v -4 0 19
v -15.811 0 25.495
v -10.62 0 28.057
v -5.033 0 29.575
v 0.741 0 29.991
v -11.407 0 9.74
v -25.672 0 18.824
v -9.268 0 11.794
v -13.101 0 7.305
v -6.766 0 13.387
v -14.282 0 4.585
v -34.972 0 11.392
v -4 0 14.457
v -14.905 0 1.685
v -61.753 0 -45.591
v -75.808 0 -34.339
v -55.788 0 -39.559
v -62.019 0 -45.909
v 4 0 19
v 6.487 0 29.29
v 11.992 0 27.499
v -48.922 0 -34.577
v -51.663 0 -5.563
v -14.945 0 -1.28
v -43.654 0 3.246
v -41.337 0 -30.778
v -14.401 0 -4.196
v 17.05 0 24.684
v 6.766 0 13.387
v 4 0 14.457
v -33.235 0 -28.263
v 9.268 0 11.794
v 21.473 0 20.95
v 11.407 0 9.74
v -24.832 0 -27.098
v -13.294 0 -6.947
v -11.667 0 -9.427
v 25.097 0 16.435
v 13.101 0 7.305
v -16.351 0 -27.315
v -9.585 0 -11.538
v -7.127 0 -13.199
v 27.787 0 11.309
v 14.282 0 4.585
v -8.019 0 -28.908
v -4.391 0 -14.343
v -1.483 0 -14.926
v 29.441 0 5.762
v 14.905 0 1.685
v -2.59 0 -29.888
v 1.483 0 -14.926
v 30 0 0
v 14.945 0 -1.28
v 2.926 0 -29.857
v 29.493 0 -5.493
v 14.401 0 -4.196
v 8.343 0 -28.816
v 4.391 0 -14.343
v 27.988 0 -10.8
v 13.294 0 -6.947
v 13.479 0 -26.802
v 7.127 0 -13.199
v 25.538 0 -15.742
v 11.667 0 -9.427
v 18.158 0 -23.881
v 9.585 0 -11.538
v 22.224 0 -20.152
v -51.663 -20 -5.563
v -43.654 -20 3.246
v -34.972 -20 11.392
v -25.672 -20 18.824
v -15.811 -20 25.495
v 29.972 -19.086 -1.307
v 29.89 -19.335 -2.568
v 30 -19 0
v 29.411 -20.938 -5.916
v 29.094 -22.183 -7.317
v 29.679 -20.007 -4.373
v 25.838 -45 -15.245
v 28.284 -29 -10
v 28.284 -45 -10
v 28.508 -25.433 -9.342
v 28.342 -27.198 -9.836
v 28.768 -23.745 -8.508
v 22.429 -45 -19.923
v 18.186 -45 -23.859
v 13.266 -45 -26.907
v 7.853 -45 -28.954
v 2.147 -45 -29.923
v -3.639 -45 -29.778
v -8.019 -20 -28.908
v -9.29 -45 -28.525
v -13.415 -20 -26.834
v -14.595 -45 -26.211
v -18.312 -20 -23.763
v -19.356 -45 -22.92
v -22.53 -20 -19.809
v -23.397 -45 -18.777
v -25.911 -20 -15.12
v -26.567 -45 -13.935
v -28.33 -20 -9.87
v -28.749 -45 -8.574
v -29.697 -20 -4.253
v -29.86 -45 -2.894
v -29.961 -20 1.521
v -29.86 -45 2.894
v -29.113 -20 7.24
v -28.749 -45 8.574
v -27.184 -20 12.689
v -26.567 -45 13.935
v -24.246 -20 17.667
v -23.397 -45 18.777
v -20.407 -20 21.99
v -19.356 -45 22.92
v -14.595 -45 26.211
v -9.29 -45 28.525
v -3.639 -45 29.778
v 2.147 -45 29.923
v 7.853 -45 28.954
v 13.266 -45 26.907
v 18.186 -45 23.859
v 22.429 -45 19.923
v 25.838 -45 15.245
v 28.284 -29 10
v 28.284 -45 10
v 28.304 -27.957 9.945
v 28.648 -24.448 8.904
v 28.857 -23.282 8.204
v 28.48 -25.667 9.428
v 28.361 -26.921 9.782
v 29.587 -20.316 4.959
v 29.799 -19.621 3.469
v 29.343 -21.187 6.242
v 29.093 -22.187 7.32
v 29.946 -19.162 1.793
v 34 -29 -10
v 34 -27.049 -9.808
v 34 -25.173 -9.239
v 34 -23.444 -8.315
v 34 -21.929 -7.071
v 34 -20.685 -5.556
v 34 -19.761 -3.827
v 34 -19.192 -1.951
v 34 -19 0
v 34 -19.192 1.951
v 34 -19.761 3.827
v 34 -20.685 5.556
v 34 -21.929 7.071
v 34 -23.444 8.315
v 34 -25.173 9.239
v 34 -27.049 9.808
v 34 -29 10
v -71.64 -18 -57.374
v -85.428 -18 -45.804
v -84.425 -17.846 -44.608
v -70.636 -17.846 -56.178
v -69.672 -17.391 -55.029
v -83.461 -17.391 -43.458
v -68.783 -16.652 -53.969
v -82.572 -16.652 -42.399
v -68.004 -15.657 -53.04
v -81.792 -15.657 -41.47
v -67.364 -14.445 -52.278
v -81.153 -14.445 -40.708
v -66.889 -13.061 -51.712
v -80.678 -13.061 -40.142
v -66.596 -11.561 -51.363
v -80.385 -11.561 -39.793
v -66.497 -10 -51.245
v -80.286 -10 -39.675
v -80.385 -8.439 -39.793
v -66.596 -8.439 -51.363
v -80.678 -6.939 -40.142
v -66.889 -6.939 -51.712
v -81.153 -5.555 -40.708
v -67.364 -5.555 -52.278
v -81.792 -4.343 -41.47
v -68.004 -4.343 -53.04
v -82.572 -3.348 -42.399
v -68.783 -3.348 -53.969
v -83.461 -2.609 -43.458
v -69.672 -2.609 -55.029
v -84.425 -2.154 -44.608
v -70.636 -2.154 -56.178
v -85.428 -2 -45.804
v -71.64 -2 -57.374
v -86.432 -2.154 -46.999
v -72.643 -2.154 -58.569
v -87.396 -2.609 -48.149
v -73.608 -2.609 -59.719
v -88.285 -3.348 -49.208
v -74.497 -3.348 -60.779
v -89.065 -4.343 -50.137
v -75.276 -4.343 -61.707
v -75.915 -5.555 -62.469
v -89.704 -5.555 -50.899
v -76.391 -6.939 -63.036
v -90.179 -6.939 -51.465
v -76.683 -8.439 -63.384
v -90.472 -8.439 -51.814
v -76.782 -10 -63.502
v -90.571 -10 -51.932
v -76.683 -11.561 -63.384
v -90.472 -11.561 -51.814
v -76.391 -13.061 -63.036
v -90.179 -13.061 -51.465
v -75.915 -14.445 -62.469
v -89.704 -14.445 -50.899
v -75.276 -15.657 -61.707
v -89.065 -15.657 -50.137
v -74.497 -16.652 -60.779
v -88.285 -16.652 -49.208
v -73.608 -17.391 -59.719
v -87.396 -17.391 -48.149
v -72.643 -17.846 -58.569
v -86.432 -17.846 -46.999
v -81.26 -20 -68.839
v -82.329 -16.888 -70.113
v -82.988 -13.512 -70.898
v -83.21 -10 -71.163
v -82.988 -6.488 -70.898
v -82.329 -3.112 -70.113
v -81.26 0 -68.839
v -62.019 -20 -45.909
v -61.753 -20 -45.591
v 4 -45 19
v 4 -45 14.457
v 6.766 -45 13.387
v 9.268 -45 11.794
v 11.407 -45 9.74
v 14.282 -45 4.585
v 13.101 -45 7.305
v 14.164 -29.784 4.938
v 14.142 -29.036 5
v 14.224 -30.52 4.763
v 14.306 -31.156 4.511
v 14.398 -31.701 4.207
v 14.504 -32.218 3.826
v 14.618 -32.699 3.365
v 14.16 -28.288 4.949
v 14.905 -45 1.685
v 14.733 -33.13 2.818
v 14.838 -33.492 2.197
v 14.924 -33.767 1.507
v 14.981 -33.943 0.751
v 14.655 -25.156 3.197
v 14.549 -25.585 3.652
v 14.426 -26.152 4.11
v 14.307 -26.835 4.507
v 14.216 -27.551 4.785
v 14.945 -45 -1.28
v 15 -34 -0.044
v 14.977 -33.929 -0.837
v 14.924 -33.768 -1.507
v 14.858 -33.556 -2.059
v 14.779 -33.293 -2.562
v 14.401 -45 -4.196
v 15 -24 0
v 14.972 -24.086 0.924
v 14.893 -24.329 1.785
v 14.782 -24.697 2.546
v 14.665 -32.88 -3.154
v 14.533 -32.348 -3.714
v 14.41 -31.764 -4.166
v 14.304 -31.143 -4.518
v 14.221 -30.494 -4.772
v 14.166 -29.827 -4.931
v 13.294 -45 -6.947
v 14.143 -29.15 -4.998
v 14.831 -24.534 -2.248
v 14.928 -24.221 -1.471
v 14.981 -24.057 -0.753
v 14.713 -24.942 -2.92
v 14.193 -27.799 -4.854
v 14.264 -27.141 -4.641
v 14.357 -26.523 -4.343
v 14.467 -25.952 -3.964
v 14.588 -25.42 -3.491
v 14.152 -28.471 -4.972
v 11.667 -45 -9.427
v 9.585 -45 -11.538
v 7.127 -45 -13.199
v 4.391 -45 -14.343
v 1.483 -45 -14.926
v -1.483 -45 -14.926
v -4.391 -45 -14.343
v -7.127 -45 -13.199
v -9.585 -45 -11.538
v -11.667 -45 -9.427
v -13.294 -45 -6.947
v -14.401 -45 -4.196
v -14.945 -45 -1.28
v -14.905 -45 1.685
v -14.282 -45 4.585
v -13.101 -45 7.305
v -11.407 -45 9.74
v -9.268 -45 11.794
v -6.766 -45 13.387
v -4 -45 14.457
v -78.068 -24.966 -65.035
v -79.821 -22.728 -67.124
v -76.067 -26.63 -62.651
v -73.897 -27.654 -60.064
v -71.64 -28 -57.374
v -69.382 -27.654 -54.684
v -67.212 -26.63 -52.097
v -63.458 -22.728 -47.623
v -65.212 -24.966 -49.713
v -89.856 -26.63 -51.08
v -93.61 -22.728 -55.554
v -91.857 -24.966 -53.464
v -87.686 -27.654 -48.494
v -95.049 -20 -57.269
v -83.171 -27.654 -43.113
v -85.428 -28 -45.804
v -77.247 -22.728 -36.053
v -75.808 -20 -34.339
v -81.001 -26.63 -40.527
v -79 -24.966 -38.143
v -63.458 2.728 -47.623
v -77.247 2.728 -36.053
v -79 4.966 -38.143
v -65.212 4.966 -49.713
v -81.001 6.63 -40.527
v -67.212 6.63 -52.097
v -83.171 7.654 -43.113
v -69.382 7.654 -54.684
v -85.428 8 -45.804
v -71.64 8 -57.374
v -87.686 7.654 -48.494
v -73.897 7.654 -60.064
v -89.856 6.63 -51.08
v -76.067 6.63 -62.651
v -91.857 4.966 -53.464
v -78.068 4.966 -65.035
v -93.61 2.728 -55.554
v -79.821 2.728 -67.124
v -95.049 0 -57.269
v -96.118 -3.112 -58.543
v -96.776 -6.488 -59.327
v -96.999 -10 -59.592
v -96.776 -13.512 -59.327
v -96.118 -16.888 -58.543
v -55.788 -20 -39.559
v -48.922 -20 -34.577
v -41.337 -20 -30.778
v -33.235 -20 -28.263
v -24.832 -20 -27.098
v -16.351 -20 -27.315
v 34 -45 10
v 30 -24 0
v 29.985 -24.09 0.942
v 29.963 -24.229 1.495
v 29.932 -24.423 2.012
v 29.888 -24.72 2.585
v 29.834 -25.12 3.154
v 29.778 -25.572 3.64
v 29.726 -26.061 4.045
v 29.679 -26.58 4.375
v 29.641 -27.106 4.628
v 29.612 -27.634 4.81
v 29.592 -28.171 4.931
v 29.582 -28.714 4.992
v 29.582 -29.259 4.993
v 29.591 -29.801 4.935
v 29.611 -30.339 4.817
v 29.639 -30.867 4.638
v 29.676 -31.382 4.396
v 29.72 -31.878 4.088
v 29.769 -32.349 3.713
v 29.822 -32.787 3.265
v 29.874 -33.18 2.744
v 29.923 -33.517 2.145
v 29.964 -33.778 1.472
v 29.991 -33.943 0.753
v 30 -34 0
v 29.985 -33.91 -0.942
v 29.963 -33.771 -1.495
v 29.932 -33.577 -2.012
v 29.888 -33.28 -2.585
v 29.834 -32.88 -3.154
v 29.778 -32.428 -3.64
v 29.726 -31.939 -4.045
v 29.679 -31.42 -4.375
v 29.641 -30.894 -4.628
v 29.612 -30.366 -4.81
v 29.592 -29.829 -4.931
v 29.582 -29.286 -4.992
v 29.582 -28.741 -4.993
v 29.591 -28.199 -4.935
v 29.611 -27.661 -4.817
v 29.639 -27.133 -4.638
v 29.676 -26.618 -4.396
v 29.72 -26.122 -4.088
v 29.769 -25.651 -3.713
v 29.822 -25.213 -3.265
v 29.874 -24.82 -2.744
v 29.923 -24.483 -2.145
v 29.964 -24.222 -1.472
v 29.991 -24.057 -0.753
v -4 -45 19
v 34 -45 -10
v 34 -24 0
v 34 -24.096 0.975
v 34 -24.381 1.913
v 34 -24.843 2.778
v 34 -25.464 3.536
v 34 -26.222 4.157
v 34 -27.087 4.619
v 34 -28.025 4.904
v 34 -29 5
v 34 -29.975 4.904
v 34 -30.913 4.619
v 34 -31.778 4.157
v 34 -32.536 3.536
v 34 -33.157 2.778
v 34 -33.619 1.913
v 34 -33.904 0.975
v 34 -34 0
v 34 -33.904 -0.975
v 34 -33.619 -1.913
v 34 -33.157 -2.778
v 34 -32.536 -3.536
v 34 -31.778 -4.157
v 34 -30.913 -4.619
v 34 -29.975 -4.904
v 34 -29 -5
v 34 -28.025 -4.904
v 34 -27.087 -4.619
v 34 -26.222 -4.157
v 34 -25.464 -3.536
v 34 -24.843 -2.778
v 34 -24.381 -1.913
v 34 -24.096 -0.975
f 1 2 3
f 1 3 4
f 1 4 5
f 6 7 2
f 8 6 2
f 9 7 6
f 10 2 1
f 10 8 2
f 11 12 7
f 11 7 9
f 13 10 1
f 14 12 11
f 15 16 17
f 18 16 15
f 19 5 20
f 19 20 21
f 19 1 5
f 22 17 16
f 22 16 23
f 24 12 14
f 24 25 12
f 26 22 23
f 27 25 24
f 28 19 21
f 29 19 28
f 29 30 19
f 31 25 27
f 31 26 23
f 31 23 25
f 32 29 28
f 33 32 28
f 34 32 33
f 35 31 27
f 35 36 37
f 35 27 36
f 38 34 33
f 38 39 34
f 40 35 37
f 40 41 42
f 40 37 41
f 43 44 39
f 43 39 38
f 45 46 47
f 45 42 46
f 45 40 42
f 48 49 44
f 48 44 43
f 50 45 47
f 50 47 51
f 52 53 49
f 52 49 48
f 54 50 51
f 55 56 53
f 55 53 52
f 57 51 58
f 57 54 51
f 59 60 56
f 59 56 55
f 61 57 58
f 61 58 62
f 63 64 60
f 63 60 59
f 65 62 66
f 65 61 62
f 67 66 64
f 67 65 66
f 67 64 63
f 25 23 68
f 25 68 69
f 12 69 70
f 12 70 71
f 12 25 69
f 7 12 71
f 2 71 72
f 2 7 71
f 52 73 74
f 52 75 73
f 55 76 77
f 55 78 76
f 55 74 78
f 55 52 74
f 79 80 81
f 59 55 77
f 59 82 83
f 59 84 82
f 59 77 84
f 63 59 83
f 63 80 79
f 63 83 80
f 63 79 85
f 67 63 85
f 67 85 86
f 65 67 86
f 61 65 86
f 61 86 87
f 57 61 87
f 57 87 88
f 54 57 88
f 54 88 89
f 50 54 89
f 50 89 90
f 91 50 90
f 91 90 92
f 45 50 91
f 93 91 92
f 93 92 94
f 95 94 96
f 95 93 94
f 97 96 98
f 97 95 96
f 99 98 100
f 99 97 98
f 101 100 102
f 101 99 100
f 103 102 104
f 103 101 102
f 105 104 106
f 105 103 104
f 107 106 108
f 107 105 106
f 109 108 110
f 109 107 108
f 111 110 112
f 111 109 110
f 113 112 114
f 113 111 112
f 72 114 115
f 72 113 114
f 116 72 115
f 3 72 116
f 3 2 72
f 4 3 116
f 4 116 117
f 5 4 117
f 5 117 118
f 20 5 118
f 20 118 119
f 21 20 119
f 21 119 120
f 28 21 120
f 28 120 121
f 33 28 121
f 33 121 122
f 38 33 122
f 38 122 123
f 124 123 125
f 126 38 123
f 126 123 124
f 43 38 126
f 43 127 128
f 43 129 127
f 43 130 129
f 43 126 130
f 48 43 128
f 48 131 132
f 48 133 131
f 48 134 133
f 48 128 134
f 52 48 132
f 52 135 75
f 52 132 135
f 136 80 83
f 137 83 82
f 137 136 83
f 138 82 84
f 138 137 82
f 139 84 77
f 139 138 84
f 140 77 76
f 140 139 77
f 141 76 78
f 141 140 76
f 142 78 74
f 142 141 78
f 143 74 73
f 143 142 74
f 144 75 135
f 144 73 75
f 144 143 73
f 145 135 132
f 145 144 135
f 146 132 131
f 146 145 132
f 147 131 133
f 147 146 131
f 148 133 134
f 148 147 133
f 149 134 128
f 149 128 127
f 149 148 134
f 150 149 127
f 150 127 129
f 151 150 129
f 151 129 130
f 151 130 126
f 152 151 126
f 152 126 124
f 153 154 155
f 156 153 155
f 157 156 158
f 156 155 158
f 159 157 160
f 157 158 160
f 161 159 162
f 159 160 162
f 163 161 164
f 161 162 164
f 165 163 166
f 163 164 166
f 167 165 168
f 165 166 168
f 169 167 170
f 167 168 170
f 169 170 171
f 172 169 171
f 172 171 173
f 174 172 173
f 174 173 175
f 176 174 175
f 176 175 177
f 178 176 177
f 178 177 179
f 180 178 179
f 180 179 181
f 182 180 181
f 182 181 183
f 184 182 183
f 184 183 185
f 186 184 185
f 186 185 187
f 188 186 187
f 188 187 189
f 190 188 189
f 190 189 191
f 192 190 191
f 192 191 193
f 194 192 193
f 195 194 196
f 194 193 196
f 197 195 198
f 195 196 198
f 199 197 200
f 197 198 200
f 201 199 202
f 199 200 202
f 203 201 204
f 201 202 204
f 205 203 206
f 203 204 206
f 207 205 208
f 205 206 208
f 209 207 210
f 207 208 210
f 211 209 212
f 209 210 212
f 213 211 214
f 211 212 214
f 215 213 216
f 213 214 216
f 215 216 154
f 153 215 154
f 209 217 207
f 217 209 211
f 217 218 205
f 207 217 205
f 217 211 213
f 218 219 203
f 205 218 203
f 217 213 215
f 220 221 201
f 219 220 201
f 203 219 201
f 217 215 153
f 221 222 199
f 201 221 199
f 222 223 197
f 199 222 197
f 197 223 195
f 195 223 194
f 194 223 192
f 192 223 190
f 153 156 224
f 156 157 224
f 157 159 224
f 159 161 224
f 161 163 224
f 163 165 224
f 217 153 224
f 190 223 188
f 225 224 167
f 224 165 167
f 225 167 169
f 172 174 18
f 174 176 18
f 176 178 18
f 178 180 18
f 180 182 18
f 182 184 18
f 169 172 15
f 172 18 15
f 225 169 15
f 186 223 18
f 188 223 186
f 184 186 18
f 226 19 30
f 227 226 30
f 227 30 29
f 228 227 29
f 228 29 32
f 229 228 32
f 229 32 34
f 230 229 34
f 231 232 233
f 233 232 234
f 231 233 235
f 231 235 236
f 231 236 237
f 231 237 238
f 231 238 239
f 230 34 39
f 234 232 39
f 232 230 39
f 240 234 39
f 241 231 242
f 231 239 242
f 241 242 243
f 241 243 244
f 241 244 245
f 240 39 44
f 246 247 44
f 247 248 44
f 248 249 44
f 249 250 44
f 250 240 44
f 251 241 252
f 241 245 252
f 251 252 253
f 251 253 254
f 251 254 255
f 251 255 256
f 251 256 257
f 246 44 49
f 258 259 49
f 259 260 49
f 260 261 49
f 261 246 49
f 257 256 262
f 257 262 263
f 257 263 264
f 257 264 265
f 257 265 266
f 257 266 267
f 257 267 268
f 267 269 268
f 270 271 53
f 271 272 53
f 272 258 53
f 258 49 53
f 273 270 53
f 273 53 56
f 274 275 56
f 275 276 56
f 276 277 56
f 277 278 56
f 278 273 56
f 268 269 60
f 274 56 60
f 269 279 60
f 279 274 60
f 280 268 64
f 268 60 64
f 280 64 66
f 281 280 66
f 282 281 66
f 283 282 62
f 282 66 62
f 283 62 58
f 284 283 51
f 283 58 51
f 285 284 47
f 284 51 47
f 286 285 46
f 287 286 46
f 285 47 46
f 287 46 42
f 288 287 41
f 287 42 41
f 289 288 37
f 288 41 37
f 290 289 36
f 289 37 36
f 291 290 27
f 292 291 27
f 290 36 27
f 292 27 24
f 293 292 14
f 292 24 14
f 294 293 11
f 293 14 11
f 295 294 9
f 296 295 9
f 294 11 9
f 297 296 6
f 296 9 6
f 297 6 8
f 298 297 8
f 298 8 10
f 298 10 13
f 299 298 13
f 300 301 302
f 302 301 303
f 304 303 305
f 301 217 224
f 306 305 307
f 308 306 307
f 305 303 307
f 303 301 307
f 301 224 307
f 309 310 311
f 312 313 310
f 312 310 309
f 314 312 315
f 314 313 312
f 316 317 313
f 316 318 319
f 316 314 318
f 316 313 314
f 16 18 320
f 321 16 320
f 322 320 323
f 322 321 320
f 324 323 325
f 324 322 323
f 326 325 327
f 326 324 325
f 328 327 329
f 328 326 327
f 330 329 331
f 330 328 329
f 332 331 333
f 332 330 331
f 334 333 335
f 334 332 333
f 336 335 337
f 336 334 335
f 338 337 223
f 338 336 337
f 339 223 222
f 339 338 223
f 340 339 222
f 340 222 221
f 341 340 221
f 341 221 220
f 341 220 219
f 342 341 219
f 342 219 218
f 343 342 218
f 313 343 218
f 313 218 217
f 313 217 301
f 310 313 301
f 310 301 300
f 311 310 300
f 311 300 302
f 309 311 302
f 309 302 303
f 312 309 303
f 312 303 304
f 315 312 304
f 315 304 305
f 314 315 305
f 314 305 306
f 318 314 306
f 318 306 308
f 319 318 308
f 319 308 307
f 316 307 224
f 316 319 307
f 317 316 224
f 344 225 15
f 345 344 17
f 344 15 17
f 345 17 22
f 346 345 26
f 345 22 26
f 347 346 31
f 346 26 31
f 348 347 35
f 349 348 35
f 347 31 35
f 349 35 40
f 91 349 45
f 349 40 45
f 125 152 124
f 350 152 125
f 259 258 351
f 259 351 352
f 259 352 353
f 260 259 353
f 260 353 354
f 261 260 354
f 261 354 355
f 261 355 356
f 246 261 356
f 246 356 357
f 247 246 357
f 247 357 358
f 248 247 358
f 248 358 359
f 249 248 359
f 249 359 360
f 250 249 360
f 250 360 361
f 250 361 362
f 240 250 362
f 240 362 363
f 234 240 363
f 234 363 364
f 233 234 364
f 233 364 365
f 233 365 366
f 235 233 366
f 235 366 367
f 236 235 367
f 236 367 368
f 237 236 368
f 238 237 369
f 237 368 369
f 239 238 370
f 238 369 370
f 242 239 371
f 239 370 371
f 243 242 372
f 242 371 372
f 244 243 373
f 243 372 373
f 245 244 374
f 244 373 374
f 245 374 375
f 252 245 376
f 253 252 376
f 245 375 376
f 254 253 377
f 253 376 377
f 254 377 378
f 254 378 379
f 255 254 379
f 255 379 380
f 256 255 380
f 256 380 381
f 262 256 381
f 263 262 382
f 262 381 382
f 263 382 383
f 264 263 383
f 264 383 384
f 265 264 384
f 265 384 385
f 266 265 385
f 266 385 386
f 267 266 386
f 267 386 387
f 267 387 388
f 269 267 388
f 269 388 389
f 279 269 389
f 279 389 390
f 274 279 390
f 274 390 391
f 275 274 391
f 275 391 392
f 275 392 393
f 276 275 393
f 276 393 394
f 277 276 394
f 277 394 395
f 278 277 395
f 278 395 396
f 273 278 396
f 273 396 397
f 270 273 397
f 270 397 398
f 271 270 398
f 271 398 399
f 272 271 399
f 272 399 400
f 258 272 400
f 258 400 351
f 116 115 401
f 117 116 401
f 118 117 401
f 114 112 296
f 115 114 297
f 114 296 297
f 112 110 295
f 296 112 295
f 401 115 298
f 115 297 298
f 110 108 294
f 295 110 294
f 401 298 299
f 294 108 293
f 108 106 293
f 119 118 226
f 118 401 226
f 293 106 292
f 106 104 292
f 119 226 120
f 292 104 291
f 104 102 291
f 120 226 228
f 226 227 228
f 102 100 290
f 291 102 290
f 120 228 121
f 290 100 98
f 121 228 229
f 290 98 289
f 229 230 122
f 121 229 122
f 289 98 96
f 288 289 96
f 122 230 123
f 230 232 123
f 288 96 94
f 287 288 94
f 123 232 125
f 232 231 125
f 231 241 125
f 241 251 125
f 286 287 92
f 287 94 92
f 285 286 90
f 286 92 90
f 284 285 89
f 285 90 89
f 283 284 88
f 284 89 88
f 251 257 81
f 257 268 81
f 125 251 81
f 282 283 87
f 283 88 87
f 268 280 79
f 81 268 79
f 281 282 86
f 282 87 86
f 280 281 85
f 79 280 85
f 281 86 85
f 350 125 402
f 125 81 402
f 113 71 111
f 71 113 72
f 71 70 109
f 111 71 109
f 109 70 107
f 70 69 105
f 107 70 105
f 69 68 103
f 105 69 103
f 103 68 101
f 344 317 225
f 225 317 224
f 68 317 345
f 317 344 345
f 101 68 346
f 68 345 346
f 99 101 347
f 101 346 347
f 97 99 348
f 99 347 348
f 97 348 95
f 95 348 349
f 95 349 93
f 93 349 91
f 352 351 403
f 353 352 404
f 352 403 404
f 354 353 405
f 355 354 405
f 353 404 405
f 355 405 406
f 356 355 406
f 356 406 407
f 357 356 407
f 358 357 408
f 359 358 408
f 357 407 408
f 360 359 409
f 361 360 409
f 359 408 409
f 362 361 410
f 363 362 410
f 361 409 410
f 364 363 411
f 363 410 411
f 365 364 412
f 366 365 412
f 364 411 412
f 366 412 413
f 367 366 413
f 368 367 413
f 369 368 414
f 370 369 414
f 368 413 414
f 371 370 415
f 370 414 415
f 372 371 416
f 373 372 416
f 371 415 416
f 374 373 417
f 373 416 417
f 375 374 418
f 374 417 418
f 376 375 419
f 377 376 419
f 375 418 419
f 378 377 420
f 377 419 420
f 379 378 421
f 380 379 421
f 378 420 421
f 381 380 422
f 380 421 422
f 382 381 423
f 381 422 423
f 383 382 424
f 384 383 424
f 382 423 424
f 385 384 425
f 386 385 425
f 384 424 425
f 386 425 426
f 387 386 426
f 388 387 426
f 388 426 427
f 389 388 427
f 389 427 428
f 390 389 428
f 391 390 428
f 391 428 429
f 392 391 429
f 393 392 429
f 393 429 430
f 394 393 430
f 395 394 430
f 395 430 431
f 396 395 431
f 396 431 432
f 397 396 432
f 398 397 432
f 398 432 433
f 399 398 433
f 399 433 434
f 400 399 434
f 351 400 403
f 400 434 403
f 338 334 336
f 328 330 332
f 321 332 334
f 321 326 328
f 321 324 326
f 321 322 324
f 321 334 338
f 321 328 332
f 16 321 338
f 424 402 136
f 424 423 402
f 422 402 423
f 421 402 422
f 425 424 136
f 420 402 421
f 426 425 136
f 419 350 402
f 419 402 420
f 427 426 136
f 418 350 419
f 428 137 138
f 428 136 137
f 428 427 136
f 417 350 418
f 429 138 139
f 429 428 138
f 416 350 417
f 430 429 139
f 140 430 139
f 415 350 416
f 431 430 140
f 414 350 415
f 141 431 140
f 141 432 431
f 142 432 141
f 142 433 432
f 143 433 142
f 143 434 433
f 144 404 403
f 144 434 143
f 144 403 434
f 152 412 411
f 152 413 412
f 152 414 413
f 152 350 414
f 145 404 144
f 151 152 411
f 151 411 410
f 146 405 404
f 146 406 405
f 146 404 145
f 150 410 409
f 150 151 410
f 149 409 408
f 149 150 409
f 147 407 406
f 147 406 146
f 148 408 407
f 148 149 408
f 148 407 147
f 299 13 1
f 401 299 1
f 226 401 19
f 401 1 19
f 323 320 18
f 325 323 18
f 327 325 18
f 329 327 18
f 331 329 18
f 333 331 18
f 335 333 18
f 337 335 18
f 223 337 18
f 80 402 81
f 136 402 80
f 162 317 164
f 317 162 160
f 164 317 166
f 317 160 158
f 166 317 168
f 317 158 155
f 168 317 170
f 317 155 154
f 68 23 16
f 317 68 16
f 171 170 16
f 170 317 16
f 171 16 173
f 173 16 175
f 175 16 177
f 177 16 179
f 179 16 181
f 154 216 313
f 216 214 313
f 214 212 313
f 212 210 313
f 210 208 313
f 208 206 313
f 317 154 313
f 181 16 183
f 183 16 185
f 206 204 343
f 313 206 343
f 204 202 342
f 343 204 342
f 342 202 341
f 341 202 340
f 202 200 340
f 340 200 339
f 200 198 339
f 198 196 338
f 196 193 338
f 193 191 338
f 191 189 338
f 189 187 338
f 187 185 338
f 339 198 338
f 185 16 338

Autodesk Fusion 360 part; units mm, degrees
sketch "草图1" plane through (0, 0, 0) normal (0, 1, 0) x (1, 0, 0)
  circle A0 centre (0, 0) radius 30
  arc A1 (-51.6628, 5.5633) -> (-15.811, -25.4954) centre (63.2438, 101.9815) ccw
  arc A2 (-61.753, 45.5913) -> (-8.019, 28.9084) centre (-21.9187, 79.0163) ccw
  line L0 (-51.6628, 5.5633) -> (-136.7415, 106.9562)
  line L1 (-136.7415, 106.9562) -> (-122.9527, 118.5264)
  line L2 (-122.9527, 118.5264) -> (-61.753, 45.5913)
  line L3 (0, -75) -> (0, 85) construction
  line L4 (-4, -14.4568) -> (-4, -19)
  line L5 (-4, -19) -> (4, -19)
  line L6 (4, -19) -> (4, -14.4568)
  arc A3 (4, -14.4568) -> (-4, -14.4568) centre (0, 0) ccw
  line L7 (-150, 0) -> (60, 0) construction
  dimension "d1" = 30
  dimension "d2" = 60
  dimension "d3" = 8
  dimension "d4" = 19
  dimension "d5" = 18
  dimension "d6" = 130
  dimension "d7" = 52
  dimension "d8" = 150
  dimension "d9" = 36
extrude "拉伸1" add sketch "草图1" against normal blind 45 contours A0
extrude "拉伸2" add sketch "草图1" against normal blind 20 contours A0 A1 A2 L0 L1 L2
sketch "草图2" plane through (-27.5776, 0, 23.1404) normal (-0.766, 0, 0.6428) x (0, -1, 0)
  line L0 (0, -37.47) -> (0, -169.829)
  line L1 (0, -169.829) -> (20, -169.829)
  line L2 (20, -169.829) -> (20, -37.47)
  line L3 (20, -37.47) -> (0, -37.47)
  circle A0 centre (10, -90) radius 18
  circle A1 centre (10, -90) radius 8
  line L4 (0, -90) -> (20, -90)
  line L5 (0, -90) -> (-8, -90)
  line L6 (20, -90) -> (28, -90)
  dimension "d14" = 16
  dimension "d15" = 36
  dimension "d16" = 90
  dimension "d17" = 10
extrude "拉伸3" cut sketch "草图2" against normal blind 35 contours L0 L1 L2 A0
extrude "拉伸4" add sketch "草图2" against normal blind 18 contours L0 L2 A0 A1 L4 | L0 A0 L5 | L0 L2 A0 A1 L4 | L0 A0 L5 | L2 A0 L6 | L2 A0 L6
extrude "拉伸5" cut sketch "草图2" against normal blind 25 contours A1 L4 | A1 L4
ref_plane "工作平面1" through (34, 0, 0) normal (1, 0, 0) x (0, 1, 0)
sketch "草图3" plane through (34, 0, 0) normal (1, 0, 0) x (0, 1, 0)
  circle A0 centre (-29, 0) radius 5
  circle A1 centre (-29, 0) radius 10
  line L0 (-29, 10) -> (-45, 10)
  line L1 (-45, 10) -> (-45, -10)
  line L2 (-45, -10) -> (-29, -10)
  line L3 (-100, 0) -> (30, 0) construction
  dimension "d25" = 10
  dimension "d26" = 20
  dimension "d27" = 16
  dimension "d28" = 45
extrude "拉伸6" add sketch "草图3" against normal blind 10
extrude "拉伸7" cut sketch "草图3" against normal blind 25 contours A0
